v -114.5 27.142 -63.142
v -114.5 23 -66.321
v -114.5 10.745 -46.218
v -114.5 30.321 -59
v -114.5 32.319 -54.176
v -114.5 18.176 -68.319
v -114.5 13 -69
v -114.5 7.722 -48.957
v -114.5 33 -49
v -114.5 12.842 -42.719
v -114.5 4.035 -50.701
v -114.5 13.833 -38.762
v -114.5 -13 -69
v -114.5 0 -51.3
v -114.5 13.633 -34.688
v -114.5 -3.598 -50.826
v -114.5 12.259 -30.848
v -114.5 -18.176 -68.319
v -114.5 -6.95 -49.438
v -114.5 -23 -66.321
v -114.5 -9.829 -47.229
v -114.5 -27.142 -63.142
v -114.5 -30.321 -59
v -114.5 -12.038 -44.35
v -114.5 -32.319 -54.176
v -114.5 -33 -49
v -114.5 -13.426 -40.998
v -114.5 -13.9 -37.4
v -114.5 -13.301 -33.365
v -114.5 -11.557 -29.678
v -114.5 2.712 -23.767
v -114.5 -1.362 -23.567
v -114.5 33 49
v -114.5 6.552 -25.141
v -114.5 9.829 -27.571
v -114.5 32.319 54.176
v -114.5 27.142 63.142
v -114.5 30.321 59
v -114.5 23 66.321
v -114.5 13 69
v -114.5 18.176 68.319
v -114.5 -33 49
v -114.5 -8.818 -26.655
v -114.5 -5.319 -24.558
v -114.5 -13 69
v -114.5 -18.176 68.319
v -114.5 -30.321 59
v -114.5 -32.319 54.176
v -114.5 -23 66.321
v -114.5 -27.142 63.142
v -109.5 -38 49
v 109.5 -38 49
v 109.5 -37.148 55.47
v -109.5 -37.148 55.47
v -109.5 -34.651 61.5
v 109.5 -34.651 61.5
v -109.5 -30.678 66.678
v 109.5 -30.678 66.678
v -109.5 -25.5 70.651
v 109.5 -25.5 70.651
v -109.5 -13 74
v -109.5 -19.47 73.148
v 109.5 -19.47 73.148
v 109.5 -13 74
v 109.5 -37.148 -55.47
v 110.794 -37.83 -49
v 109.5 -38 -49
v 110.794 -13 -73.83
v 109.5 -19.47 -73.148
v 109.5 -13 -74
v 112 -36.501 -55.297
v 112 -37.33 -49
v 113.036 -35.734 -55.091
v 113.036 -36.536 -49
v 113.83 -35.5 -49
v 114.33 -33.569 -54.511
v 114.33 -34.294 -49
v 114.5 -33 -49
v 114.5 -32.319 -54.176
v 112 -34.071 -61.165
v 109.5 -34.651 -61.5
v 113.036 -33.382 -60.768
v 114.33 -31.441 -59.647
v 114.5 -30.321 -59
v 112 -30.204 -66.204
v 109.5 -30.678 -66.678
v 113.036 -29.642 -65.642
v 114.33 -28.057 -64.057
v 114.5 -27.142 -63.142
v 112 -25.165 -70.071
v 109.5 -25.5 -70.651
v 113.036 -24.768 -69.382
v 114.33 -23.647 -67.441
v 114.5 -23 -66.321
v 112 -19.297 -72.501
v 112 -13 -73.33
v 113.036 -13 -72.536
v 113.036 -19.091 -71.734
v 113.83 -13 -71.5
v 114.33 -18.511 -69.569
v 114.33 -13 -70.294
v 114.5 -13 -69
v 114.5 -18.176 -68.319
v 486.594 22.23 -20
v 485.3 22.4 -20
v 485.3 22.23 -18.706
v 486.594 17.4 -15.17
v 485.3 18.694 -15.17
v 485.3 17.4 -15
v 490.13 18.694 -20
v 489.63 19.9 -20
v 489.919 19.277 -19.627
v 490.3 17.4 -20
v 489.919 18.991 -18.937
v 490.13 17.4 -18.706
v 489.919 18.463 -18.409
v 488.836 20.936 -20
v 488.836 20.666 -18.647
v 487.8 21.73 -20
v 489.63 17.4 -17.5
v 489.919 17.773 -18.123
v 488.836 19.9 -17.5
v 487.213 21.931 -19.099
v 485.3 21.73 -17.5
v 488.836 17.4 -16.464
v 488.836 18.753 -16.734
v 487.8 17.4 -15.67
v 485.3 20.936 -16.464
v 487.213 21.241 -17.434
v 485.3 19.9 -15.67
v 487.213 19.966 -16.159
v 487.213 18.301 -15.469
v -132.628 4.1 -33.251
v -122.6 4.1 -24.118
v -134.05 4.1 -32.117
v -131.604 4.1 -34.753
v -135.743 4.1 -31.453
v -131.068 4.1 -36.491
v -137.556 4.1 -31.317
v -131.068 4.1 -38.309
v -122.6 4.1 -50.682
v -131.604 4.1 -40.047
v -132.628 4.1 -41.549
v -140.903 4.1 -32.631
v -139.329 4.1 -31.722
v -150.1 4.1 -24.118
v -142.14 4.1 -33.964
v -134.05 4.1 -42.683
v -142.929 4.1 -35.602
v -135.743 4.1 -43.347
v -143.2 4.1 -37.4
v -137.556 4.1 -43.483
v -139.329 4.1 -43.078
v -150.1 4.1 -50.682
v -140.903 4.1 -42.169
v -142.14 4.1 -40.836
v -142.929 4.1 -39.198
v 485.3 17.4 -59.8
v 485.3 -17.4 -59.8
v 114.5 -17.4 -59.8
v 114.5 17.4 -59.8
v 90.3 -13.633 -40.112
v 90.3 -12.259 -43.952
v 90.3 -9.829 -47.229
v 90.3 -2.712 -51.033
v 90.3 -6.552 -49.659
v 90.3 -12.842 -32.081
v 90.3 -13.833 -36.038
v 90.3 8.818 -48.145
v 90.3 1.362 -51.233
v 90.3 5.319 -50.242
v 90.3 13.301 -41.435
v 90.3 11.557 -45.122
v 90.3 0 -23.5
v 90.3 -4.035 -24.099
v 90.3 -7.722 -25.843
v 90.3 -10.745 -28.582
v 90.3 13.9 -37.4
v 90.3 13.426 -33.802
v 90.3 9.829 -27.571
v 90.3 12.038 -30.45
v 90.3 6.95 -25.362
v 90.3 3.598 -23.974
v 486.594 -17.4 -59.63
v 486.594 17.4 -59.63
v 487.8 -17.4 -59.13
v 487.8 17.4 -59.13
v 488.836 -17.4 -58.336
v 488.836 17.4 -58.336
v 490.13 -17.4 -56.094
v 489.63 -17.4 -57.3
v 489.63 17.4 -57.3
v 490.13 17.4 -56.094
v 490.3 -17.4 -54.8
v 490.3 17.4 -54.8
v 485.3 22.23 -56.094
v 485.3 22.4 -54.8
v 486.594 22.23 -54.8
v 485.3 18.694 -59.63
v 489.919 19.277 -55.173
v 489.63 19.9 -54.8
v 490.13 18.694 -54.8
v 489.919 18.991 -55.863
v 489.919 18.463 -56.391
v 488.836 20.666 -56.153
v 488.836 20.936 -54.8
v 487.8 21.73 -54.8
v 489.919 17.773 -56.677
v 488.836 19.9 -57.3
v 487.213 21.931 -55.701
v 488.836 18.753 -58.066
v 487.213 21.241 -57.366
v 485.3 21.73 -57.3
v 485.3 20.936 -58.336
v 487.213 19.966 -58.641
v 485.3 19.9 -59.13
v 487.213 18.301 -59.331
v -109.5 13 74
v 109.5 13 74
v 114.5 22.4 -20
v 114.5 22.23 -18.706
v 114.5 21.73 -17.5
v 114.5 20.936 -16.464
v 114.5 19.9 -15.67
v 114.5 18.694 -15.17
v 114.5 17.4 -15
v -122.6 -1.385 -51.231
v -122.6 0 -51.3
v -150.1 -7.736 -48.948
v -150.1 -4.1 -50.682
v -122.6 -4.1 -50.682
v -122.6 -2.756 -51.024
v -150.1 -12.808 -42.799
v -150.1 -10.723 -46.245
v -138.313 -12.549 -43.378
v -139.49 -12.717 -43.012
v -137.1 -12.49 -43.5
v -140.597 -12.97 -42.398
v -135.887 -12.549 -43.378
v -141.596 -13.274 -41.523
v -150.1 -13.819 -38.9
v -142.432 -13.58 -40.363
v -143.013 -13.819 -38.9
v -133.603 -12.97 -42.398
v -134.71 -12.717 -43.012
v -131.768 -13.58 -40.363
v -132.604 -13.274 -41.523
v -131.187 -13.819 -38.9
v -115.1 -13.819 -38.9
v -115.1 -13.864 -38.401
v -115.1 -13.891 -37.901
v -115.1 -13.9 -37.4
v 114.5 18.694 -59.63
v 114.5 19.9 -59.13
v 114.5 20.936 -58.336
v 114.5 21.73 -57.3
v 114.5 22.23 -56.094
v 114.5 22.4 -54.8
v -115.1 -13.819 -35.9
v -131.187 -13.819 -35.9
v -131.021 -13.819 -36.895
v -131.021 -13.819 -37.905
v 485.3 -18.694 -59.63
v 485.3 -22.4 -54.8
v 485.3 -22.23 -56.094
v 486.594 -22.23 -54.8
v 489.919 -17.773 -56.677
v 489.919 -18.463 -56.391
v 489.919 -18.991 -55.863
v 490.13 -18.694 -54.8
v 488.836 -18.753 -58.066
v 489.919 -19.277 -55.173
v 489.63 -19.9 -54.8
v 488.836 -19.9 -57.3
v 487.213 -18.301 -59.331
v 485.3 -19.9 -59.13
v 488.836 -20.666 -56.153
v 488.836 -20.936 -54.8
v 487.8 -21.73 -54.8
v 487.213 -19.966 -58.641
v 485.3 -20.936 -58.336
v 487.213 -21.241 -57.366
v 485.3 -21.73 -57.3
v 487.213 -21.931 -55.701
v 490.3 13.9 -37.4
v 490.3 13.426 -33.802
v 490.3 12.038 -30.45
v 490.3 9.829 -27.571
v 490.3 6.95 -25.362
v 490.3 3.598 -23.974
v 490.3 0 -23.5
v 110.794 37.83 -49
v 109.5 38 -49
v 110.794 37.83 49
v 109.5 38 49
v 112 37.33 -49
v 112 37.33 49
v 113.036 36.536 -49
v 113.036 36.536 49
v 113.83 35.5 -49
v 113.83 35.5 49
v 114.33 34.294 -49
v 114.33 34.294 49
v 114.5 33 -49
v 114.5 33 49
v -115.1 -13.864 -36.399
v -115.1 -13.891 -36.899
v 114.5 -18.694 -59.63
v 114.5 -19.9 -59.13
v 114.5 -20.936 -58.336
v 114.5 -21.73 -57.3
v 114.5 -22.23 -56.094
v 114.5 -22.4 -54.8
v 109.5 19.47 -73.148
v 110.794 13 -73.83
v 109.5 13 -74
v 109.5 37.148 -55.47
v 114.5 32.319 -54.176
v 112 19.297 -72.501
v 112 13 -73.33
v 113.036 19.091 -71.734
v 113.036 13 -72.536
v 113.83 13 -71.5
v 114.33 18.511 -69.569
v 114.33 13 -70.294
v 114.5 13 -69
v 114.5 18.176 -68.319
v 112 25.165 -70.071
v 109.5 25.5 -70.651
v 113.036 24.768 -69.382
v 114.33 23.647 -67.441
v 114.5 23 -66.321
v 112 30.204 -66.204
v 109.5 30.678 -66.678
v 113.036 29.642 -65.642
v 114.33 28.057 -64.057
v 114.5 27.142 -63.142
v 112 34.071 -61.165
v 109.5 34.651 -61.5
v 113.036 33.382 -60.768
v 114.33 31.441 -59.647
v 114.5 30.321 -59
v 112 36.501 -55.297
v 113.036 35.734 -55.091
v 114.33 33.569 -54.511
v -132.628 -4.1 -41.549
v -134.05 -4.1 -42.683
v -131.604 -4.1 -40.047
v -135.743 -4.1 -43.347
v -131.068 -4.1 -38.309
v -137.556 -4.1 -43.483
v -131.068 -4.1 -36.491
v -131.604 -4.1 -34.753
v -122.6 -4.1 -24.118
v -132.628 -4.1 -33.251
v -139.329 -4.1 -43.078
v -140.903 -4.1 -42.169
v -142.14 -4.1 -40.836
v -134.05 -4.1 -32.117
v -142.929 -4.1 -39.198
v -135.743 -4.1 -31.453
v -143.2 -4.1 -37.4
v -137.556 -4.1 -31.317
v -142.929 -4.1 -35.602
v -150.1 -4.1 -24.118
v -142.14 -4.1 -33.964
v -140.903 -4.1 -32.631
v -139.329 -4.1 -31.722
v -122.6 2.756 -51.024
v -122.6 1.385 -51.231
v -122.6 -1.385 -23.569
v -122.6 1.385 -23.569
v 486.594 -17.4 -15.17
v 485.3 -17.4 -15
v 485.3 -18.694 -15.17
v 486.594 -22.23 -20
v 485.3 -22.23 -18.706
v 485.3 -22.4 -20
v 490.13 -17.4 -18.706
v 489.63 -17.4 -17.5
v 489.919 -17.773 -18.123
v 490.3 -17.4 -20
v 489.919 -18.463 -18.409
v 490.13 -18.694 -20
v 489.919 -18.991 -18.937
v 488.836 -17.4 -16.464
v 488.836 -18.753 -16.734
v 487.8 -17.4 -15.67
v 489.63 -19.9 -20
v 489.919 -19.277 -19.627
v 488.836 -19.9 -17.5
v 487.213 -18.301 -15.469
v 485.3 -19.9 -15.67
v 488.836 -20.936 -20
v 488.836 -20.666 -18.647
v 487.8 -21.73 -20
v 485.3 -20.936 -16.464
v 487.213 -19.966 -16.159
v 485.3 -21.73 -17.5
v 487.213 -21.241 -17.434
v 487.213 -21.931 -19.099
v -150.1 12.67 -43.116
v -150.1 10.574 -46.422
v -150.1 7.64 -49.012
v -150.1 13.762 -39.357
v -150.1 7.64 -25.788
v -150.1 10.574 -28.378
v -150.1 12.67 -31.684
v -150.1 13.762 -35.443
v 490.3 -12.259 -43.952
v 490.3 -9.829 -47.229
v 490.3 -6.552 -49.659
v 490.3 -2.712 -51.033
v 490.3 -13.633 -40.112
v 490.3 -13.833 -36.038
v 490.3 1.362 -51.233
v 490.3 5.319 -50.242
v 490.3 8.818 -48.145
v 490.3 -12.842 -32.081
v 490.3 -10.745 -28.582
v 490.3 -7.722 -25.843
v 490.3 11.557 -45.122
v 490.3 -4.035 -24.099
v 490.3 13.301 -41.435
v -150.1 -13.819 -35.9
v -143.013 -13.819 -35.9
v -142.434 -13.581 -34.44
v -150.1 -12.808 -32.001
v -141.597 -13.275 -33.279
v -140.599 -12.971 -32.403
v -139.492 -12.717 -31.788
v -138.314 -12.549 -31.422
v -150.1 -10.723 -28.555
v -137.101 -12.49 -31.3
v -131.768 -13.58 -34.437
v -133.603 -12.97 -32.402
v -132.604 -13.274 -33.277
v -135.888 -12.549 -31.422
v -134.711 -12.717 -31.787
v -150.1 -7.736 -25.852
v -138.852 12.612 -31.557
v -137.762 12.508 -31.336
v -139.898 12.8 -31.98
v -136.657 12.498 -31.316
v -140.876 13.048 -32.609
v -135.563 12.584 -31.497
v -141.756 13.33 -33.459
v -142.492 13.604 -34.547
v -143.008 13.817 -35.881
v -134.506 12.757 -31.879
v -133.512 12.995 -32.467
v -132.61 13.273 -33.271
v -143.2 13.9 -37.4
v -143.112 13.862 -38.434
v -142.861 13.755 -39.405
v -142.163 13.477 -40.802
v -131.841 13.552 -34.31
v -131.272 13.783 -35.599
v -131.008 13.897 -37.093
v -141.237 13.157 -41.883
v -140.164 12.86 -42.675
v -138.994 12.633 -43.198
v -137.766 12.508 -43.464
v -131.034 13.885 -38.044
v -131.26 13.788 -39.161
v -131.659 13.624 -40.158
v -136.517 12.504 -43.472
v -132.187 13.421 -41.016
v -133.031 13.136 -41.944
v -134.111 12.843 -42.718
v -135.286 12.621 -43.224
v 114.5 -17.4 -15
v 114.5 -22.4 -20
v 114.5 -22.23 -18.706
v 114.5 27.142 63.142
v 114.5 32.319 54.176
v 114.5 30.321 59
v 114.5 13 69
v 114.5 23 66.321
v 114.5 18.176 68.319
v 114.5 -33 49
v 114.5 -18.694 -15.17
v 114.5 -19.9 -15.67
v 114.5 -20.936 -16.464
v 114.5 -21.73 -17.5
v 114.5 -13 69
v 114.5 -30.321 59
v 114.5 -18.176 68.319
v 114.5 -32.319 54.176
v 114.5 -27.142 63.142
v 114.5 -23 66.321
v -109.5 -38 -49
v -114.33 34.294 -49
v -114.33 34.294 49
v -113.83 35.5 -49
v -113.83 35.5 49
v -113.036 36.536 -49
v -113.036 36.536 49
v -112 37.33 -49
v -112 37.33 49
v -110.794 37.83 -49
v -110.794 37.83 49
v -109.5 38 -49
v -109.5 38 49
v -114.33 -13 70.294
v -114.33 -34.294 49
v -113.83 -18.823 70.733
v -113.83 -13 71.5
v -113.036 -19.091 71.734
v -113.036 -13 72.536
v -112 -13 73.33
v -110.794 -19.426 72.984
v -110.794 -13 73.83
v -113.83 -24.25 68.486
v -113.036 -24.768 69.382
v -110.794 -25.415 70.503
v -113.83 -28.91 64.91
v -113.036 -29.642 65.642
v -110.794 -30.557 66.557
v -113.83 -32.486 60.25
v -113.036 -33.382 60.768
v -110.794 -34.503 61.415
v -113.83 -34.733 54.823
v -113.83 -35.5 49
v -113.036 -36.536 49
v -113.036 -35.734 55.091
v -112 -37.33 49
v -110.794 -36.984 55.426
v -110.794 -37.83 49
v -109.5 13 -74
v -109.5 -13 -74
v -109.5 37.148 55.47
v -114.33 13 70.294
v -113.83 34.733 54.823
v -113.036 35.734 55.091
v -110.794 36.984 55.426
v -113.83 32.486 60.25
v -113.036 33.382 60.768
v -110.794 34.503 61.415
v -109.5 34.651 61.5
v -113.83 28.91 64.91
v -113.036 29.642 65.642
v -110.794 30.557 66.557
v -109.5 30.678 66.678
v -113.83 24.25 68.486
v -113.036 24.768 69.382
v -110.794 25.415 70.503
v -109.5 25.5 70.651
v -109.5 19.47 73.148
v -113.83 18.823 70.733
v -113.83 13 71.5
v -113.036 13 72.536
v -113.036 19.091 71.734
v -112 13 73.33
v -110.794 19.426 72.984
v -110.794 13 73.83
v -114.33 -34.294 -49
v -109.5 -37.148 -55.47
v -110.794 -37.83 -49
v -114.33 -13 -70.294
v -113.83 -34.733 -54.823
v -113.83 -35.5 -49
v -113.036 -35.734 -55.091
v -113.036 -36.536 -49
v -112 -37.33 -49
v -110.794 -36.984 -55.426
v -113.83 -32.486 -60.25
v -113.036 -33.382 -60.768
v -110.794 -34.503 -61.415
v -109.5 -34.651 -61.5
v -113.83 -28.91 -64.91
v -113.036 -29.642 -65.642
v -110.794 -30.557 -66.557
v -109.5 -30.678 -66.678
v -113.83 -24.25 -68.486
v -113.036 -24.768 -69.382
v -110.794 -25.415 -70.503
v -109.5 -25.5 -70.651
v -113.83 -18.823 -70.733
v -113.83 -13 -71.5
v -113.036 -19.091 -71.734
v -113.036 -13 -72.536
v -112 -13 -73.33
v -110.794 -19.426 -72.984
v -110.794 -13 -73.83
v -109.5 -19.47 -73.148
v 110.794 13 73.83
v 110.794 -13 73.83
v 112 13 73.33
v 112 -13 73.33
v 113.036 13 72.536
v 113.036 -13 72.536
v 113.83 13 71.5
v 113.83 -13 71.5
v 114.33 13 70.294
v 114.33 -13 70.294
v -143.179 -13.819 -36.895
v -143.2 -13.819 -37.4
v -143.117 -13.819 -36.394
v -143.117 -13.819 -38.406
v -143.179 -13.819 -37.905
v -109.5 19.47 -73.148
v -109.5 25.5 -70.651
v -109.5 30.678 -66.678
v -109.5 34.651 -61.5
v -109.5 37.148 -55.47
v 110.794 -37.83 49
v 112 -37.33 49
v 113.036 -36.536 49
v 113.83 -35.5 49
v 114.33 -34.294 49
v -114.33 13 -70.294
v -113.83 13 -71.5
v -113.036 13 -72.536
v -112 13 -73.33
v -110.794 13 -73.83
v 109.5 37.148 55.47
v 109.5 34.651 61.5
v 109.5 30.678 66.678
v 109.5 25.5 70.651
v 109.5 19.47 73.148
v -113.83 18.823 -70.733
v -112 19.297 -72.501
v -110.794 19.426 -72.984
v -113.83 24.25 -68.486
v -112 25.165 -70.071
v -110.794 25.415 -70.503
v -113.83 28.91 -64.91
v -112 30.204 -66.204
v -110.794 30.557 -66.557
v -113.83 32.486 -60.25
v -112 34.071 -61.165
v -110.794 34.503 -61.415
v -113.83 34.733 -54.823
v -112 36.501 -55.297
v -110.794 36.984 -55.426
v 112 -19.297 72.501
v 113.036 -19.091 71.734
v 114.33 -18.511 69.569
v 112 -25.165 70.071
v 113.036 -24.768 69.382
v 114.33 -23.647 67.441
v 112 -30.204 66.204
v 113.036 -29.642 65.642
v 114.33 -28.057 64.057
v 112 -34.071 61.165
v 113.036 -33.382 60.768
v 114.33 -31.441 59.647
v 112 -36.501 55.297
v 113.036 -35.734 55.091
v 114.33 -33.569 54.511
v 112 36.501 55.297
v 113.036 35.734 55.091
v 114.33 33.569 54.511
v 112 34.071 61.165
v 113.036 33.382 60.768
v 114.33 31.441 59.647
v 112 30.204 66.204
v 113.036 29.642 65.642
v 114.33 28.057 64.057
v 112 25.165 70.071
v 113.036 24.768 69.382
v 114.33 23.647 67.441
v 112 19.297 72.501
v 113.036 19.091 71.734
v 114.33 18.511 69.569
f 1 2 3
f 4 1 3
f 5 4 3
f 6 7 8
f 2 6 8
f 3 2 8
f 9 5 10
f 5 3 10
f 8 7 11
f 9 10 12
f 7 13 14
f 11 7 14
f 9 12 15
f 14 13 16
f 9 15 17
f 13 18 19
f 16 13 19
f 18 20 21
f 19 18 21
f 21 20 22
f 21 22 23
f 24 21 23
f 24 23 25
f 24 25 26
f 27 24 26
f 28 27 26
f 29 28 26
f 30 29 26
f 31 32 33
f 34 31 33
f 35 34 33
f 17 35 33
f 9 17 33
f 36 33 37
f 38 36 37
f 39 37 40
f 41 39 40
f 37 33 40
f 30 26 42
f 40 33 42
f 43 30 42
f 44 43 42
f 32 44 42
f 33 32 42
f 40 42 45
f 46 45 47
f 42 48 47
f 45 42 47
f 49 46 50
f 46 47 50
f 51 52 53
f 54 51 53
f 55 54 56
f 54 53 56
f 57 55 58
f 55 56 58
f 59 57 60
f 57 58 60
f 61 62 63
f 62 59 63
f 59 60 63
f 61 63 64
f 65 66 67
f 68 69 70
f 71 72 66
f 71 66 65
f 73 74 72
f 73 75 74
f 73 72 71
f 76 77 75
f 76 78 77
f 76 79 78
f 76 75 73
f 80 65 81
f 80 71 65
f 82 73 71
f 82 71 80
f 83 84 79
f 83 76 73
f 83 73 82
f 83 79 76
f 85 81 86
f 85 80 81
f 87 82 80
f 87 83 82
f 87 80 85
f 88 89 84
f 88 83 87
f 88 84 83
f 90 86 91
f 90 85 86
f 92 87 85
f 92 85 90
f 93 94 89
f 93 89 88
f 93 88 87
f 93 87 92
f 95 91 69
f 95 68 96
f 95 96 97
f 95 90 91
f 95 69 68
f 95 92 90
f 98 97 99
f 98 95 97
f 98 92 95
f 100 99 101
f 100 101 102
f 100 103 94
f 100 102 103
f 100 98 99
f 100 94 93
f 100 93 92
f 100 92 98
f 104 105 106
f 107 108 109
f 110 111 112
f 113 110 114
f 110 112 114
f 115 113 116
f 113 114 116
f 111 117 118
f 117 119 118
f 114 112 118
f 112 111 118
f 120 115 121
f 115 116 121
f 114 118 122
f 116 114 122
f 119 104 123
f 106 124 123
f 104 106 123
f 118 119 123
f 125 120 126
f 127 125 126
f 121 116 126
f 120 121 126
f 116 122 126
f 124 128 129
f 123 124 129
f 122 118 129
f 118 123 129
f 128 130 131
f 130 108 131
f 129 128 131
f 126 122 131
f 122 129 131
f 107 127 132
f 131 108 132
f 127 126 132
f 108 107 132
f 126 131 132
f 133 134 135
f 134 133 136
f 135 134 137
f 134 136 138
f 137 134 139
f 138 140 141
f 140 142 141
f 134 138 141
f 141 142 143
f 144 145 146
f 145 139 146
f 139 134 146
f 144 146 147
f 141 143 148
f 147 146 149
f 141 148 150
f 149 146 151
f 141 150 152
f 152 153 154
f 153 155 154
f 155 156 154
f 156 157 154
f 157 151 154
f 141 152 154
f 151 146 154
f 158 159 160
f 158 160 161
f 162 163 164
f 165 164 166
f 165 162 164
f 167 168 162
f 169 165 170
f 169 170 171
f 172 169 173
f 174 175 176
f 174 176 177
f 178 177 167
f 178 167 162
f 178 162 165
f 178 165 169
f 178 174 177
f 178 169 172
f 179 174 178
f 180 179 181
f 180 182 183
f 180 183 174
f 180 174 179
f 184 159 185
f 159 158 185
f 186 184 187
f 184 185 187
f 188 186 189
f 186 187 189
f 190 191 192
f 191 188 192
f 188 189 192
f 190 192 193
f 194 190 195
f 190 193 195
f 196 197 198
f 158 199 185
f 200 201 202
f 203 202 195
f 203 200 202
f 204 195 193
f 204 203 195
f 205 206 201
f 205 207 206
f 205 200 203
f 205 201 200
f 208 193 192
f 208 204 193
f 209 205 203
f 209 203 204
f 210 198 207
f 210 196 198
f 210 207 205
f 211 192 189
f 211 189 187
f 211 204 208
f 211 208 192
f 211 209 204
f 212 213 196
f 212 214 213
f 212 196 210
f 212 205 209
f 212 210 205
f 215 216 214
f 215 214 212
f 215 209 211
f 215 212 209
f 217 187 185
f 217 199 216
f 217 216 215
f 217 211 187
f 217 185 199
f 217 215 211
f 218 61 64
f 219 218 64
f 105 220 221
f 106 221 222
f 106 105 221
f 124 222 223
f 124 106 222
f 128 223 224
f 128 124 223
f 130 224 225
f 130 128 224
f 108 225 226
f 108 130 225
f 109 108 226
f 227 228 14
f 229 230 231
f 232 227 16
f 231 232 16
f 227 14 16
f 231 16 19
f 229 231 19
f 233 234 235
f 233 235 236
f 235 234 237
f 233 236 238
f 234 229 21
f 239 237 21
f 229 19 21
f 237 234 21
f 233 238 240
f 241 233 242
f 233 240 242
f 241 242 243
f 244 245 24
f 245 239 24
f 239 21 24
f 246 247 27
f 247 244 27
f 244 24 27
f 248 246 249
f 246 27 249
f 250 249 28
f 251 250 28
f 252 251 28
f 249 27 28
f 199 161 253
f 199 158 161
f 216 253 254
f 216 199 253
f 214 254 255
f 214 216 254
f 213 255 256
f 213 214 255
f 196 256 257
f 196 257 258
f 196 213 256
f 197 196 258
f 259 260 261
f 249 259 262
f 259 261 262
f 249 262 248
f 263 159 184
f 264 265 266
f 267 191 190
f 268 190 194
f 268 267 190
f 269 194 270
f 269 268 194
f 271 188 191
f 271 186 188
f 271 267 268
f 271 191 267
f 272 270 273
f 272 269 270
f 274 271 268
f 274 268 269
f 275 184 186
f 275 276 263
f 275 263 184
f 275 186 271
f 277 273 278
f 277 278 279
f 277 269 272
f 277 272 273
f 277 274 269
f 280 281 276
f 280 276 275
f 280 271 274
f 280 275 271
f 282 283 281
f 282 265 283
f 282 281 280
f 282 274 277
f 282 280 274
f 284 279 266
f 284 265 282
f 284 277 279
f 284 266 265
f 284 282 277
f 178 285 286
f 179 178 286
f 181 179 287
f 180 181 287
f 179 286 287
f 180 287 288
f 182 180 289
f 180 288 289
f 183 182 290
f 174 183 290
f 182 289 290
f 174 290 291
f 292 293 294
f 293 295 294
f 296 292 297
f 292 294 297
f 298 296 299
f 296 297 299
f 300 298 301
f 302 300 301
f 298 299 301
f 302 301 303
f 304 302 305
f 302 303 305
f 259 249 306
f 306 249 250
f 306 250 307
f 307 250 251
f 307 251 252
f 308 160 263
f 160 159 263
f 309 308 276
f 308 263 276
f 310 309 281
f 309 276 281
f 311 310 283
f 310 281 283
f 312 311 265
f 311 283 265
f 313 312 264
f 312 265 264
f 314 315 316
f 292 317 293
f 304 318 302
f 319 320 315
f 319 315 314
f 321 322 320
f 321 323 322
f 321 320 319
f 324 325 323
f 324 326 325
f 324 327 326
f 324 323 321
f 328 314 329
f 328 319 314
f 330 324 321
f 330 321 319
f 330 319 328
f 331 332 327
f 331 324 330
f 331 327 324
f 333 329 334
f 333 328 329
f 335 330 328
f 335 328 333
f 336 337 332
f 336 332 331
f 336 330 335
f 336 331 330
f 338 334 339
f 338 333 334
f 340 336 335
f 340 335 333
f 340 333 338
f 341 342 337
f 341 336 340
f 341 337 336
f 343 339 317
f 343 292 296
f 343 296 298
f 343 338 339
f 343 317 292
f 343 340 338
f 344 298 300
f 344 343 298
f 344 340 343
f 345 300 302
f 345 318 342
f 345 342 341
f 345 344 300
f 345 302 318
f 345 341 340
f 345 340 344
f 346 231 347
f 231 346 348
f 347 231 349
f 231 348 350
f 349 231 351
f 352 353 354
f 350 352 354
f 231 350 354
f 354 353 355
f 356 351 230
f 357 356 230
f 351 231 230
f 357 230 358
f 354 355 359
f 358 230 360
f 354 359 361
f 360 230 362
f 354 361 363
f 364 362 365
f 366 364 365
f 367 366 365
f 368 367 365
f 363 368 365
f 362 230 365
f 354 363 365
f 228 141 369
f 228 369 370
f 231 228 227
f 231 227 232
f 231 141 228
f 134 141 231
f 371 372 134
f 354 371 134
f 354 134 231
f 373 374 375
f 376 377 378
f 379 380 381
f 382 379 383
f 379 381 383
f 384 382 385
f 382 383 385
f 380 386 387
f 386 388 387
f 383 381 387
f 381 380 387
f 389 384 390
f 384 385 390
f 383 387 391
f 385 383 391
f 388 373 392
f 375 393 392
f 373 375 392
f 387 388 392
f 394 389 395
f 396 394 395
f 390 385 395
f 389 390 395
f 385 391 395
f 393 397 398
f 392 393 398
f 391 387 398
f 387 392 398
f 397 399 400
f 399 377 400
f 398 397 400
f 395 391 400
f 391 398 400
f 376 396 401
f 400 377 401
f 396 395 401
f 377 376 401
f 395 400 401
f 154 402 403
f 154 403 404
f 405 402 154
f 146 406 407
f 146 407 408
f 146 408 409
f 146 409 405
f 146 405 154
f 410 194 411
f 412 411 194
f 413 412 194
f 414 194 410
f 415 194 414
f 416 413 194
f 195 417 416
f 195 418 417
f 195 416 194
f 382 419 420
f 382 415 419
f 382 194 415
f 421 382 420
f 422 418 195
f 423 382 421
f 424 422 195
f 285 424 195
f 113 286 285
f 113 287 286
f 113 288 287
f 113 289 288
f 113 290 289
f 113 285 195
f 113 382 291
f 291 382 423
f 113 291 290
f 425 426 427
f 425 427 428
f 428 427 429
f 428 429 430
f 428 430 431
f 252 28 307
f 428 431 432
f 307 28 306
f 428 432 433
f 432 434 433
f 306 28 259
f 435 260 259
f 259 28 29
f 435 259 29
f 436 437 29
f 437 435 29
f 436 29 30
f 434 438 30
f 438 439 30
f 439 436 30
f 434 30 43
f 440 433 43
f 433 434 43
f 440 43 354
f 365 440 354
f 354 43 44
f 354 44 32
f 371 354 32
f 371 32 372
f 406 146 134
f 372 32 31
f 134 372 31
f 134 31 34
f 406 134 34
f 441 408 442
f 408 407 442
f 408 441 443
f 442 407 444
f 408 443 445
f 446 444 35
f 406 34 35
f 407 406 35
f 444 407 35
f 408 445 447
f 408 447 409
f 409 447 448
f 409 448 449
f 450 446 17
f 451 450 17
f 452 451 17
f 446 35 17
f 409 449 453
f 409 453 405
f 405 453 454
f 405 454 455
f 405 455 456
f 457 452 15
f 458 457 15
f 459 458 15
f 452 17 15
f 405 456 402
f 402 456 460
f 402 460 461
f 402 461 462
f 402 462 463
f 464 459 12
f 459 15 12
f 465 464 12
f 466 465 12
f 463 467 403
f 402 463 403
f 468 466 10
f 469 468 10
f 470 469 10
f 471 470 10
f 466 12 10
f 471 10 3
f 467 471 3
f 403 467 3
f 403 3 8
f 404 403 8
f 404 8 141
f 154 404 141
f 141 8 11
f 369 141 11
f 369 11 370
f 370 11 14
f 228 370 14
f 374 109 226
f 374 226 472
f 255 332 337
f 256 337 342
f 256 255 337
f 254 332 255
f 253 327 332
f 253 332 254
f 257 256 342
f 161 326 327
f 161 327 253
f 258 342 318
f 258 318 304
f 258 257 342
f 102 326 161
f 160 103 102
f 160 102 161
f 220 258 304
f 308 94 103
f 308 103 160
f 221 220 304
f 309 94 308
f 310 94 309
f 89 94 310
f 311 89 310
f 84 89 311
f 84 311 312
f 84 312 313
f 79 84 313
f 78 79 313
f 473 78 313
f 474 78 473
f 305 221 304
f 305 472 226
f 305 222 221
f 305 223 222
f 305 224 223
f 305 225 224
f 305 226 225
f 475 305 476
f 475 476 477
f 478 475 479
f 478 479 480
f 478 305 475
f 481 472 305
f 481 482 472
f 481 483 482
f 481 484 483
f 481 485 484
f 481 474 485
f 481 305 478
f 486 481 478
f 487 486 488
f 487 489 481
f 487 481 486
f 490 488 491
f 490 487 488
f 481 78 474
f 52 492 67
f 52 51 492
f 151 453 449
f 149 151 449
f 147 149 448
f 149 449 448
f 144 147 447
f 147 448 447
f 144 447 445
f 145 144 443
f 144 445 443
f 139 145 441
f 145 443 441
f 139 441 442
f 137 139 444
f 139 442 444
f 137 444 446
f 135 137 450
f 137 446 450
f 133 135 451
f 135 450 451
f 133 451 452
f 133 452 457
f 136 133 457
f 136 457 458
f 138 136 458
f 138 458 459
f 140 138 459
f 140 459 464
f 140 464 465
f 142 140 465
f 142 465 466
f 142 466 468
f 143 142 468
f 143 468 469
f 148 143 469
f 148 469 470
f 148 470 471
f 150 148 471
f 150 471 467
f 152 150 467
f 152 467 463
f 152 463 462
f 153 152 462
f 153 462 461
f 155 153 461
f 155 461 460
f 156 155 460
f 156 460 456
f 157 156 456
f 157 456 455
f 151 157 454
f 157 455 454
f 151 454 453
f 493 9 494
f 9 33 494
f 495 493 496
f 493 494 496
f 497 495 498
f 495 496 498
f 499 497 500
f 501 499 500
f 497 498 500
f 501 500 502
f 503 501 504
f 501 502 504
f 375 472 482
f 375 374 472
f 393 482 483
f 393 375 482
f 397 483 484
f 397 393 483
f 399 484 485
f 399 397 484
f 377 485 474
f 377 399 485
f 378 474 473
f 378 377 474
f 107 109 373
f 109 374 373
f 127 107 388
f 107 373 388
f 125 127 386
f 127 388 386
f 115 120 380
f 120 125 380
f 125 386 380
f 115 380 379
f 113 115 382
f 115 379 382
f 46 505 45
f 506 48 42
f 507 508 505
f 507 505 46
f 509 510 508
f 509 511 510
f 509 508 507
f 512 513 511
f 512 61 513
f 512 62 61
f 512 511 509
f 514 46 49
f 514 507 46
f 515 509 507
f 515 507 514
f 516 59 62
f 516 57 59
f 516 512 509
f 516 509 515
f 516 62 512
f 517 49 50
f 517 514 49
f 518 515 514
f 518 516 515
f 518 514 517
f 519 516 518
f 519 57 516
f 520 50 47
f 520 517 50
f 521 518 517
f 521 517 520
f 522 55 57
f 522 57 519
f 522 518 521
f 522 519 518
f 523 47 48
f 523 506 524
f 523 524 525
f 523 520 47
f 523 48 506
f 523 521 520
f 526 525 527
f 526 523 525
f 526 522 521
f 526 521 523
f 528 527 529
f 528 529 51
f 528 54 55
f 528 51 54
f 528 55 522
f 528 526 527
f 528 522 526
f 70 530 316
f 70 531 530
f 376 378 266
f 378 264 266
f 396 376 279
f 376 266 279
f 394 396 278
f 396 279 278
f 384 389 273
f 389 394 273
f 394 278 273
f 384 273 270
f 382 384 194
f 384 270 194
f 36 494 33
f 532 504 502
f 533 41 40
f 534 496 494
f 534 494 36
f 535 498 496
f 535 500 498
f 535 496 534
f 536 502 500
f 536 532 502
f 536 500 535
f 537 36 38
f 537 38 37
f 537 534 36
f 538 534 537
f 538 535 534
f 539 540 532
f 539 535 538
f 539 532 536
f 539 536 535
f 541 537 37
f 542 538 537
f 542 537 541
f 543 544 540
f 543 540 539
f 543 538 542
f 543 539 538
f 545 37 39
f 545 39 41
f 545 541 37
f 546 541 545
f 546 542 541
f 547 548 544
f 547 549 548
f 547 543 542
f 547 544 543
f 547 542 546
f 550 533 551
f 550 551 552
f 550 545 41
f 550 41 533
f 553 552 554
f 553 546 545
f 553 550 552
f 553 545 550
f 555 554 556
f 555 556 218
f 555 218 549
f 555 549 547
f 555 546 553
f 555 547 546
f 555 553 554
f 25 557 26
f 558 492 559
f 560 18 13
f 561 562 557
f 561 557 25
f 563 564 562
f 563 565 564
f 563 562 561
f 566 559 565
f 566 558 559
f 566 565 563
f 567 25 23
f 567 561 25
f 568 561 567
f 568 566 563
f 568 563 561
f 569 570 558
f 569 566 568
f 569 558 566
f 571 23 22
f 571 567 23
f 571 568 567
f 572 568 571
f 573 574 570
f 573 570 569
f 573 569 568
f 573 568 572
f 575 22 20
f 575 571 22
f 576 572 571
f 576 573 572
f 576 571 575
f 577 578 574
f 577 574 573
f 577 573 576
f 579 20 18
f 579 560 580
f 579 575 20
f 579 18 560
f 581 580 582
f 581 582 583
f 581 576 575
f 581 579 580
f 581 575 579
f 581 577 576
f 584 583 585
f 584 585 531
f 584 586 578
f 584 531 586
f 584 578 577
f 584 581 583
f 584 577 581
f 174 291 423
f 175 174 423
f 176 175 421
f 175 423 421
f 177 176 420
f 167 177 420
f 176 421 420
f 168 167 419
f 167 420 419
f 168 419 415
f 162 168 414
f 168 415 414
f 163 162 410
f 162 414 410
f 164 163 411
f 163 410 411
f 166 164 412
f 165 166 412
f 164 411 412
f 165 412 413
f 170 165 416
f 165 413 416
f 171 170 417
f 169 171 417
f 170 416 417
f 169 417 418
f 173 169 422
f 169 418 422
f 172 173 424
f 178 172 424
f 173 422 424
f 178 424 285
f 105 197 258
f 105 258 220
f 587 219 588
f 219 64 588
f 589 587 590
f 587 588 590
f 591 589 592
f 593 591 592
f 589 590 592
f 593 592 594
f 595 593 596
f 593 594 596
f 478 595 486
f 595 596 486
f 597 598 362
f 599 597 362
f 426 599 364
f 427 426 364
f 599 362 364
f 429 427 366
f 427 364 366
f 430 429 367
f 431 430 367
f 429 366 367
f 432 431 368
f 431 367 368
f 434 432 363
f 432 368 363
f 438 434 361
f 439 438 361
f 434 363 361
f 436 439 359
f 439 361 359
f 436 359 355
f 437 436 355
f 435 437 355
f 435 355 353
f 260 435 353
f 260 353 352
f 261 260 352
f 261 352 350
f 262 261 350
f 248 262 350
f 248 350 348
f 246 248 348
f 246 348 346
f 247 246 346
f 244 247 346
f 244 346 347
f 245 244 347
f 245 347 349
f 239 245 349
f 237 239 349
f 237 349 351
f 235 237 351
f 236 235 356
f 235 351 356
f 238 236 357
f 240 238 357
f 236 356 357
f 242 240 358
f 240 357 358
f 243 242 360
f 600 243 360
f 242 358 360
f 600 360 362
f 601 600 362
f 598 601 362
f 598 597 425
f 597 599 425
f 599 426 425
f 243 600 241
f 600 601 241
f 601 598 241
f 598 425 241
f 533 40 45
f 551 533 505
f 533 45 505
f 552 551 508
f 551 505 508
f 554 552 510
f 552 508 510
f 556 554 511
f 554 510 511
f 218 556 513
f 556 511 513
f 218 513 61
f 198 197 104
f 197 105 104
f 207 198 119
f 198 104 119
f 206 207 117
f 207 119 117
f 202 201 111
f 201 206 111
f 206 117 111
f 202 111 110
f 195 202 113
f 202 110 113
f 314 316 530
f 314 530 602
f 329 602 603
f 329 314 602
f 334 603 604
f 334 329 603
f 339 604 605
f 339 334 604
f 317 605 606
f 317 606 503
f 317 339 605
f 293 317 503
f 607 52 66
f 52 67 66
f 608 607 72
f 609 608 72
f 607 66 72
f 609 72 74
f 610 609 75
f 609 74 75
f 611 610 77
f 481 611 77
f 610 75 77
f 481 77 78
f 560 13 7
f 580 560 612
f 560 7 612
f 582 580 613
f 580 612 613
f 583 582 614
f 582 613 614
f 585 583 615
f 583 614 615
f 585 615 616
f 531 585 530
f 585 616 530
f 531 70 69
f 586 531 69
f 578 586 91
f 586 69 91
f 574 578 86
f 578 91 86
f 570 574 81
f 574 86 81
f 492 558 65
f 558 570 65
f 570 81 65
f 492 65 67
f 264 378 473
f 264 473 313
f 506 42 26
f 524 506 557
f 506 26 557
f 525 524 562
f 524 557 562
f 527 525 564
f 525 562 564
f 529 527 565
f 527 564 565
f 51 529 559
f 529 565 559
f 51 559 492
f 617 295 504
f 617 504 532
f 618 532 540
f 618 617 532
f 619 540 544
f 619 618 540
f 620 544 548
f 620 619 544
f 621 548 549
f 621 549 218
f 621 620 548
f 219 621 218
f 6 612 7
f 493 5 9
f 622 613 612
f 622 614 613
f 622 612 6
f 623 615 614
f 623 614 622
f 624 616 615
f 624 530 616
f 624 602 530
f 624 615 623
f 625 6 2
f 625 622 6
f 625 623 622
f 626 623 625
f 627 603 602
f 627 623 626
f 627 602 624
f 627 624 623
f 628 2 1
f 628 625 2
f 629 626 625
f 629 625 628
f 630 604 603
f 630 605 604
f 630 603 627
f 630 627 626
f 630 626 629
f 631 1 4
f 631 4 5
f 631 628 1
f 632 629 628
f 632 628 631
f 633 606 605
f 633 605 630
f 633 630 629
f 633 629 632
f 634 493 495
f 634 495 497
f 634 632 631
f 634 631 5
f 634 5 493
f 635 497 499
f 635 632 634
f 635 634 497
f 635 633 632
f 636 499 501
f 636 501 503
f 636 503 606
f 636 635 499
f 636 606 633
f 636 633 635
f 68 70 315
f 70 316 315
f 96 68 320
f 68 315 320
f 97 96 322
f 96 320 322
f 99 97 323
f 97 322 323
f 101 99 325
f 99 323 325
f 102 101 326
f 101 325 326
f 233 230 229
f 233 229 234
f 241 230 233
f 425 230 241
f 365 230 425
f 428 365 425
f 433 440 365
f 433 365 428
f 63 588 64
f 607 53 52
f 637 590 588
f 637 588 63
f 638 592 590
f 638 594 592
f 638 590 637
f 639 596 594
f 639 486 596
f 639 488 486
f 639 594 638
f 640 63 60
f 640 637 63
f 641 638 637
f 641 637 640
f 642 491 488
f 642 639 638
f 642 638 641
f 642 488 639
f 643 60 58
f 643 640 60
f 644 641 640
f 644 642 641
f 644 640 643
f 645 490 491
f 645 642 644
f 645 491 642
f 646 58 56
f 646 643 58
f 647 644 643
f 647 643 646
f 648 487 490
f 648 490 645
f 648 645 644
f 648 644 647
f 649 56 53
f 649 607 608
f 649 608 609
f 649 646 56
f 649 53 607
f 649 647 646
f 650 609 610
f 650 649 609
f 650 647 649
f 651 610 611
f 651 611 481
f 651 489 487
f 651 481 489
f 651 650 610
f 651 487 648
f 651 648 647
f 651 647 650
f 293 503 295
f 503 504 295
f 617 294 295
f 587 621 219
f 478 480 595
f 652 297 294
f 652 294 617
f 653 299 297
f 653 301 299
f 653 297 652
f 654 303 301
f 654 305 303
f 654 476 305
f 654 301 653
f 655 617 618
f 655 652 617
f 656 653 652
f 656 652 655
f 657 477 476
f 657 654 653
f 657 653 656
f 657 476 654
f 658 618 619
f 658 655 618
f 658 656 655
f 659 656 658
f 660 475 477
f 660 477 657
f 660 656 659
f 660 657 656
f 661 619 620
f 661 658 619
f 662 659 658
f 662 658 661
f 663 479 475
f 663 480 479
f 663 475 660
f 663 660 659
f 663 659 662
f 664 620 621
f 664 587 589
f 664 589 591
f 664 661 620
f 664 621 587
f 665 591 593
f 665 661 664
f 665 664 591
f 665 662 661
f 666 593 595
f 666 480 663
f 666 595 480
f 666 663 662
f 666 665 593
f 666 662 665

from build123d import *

# Parameters (mm, degrees)
F0_W      = 229
F0_H      = 148
F1_DEPTH  = 38
F3_DEPTH  = 35.6
F5_DEPTH  = 35
F7_D      = 12.2
F9_DEPTH  = 375.8
F11_R     = 25
F12_R     = 5
F13_DEPTH = 400
F15_DEPTH = 27.5


with BuildPart() as f1:
    # F0 (on Front) → F1 (new body, symmetric)
    with BuildSketch(Plane.XZ):
        Rectangle(F0_W, F0_H)
    extrude(amount=F1_DEPTH, both=True)

    # F2 (on face) → F3 (join)
    with BuildSketch(Plane(origin=(-114.5, 0, 0), x_dir=(0, -1, 0), z_dir=(-1, 0, 0))):
        with BuildLine():
            ThreePointArc((13.9, -37.4), (-9.8287842585, -27.5712157415), (0, -51.3))
            ThreePointArc((0, -51.3), (9.8287842585, -47.2287842585), (13.9, -37.4))
        make_face()
    extrude(amount=F3_DEPTH)

    # F4 (on face) → F5 (cut)
    with BuildSketch(Plane(origin=(-150.1, 0, 0), x_dir=(0, -1, 0), z_dir=(-1, 0, 0))):
        with BuildLine():
            ThreePointArc((13.9, -37.4), (13.8796920991, -36.6489026467), (13.8188277361, -35.9))
            Line((13.8188277361, -35.9), (13.8188277361, -38.9))
            ThreePointArc((13.8188277361, -38.9), (13.8796920991, -38.1510973533), (13.9, -37.4))
        make_face()
    extrude(amount=-F5_DEPTH, mode=Mode.SUBTRACT)

    # F7 (through all)
    with Locations(Plane.XZ.offset(13.8188277361)):
        with Locations((-137.1, -37.4)):
            Hole(F7_D / 2)

    # F8 (on face) → F9 (join)
    with BuildSketch(Plane.YZ.offset(114.5)):
        Polygon((-22.4, -59.8), (0, -59.8), (22.4, -59.8), (22.4, -15), (-22.4, -15), align=None)
    extrude(amount=F9_DEPTH)

    # F11
    f11_edges = [f1.edges().sort_by_distance(p)[0] for p in [
        (0, -38, 74),
        (0, 38, 74),
        (0, -38, -74),
        (0, 38, -74),
    ]]
    fillet(f11_edges, radius=F11_R)

    # F12
    f12_edges = [f1.edges().sort_by_distance(p)[0] for p in [
        (302.4, -22.4, -15),
        (302.4, 22.4, -15),
        (302.4, -22.4, -59.8),
        (302.4, 22.4, -59.8),
        (114.5, 38, 0),
        (-114.5, 38, 0),
        (490.3, 22.4, -37.4),
        (490.3, 0, -59.8),
        (490.3, 0, -15),
        (490.3, -22.4, -37.4),
    ]]
    fillet(f12_edges, radius=F12_R)

    # F10 (on face) → F13 (cut)
    with BuildSketch(Plane.YZ.offset(490.3)):
        with BuildLine():
            ThreePointArc((13.9, -37.4), (9.8287842585, -27.5712157415), (0, -23.5))
            ThreePointArc((0, -23.5), (-9.8287842585, -47.2287842585), (13.9, -37.4))
        make_face()
    extrude(amount=-F13_DEPTH, mode=Mode.SUBTRACT)

    # F14 (on face) → F15 (cut)
    with BuildSketch(Plane(origin=(-150.1, 0, 0), x_dir=(0, -1, 0), z_dir=(-1, 0, 0))):
        with BuildLine():
            ThreePointArc((4.1, -24.1184338273), (0, -23.5), (-4.1, -24.1184338273))
            Line((-4.1, -24.1184338273), (-4.1, -50.6815661727))
            ThreePointArc((-4.1, -50.6815661727), (-2.0731895957, -51.1445219961), (0, -51.3))
            ThreePointArc((0, -51.3), (2.0731895957, -51.1445219961), (4.1, -50.6815661727))
            Line((4.1, -50.6815661727), (4.1, -24.1184338273))
        make_face()
    extrude(amount=-F15_DEPTH, mode=Mode.SUBTRACT)


solid = f1.part
